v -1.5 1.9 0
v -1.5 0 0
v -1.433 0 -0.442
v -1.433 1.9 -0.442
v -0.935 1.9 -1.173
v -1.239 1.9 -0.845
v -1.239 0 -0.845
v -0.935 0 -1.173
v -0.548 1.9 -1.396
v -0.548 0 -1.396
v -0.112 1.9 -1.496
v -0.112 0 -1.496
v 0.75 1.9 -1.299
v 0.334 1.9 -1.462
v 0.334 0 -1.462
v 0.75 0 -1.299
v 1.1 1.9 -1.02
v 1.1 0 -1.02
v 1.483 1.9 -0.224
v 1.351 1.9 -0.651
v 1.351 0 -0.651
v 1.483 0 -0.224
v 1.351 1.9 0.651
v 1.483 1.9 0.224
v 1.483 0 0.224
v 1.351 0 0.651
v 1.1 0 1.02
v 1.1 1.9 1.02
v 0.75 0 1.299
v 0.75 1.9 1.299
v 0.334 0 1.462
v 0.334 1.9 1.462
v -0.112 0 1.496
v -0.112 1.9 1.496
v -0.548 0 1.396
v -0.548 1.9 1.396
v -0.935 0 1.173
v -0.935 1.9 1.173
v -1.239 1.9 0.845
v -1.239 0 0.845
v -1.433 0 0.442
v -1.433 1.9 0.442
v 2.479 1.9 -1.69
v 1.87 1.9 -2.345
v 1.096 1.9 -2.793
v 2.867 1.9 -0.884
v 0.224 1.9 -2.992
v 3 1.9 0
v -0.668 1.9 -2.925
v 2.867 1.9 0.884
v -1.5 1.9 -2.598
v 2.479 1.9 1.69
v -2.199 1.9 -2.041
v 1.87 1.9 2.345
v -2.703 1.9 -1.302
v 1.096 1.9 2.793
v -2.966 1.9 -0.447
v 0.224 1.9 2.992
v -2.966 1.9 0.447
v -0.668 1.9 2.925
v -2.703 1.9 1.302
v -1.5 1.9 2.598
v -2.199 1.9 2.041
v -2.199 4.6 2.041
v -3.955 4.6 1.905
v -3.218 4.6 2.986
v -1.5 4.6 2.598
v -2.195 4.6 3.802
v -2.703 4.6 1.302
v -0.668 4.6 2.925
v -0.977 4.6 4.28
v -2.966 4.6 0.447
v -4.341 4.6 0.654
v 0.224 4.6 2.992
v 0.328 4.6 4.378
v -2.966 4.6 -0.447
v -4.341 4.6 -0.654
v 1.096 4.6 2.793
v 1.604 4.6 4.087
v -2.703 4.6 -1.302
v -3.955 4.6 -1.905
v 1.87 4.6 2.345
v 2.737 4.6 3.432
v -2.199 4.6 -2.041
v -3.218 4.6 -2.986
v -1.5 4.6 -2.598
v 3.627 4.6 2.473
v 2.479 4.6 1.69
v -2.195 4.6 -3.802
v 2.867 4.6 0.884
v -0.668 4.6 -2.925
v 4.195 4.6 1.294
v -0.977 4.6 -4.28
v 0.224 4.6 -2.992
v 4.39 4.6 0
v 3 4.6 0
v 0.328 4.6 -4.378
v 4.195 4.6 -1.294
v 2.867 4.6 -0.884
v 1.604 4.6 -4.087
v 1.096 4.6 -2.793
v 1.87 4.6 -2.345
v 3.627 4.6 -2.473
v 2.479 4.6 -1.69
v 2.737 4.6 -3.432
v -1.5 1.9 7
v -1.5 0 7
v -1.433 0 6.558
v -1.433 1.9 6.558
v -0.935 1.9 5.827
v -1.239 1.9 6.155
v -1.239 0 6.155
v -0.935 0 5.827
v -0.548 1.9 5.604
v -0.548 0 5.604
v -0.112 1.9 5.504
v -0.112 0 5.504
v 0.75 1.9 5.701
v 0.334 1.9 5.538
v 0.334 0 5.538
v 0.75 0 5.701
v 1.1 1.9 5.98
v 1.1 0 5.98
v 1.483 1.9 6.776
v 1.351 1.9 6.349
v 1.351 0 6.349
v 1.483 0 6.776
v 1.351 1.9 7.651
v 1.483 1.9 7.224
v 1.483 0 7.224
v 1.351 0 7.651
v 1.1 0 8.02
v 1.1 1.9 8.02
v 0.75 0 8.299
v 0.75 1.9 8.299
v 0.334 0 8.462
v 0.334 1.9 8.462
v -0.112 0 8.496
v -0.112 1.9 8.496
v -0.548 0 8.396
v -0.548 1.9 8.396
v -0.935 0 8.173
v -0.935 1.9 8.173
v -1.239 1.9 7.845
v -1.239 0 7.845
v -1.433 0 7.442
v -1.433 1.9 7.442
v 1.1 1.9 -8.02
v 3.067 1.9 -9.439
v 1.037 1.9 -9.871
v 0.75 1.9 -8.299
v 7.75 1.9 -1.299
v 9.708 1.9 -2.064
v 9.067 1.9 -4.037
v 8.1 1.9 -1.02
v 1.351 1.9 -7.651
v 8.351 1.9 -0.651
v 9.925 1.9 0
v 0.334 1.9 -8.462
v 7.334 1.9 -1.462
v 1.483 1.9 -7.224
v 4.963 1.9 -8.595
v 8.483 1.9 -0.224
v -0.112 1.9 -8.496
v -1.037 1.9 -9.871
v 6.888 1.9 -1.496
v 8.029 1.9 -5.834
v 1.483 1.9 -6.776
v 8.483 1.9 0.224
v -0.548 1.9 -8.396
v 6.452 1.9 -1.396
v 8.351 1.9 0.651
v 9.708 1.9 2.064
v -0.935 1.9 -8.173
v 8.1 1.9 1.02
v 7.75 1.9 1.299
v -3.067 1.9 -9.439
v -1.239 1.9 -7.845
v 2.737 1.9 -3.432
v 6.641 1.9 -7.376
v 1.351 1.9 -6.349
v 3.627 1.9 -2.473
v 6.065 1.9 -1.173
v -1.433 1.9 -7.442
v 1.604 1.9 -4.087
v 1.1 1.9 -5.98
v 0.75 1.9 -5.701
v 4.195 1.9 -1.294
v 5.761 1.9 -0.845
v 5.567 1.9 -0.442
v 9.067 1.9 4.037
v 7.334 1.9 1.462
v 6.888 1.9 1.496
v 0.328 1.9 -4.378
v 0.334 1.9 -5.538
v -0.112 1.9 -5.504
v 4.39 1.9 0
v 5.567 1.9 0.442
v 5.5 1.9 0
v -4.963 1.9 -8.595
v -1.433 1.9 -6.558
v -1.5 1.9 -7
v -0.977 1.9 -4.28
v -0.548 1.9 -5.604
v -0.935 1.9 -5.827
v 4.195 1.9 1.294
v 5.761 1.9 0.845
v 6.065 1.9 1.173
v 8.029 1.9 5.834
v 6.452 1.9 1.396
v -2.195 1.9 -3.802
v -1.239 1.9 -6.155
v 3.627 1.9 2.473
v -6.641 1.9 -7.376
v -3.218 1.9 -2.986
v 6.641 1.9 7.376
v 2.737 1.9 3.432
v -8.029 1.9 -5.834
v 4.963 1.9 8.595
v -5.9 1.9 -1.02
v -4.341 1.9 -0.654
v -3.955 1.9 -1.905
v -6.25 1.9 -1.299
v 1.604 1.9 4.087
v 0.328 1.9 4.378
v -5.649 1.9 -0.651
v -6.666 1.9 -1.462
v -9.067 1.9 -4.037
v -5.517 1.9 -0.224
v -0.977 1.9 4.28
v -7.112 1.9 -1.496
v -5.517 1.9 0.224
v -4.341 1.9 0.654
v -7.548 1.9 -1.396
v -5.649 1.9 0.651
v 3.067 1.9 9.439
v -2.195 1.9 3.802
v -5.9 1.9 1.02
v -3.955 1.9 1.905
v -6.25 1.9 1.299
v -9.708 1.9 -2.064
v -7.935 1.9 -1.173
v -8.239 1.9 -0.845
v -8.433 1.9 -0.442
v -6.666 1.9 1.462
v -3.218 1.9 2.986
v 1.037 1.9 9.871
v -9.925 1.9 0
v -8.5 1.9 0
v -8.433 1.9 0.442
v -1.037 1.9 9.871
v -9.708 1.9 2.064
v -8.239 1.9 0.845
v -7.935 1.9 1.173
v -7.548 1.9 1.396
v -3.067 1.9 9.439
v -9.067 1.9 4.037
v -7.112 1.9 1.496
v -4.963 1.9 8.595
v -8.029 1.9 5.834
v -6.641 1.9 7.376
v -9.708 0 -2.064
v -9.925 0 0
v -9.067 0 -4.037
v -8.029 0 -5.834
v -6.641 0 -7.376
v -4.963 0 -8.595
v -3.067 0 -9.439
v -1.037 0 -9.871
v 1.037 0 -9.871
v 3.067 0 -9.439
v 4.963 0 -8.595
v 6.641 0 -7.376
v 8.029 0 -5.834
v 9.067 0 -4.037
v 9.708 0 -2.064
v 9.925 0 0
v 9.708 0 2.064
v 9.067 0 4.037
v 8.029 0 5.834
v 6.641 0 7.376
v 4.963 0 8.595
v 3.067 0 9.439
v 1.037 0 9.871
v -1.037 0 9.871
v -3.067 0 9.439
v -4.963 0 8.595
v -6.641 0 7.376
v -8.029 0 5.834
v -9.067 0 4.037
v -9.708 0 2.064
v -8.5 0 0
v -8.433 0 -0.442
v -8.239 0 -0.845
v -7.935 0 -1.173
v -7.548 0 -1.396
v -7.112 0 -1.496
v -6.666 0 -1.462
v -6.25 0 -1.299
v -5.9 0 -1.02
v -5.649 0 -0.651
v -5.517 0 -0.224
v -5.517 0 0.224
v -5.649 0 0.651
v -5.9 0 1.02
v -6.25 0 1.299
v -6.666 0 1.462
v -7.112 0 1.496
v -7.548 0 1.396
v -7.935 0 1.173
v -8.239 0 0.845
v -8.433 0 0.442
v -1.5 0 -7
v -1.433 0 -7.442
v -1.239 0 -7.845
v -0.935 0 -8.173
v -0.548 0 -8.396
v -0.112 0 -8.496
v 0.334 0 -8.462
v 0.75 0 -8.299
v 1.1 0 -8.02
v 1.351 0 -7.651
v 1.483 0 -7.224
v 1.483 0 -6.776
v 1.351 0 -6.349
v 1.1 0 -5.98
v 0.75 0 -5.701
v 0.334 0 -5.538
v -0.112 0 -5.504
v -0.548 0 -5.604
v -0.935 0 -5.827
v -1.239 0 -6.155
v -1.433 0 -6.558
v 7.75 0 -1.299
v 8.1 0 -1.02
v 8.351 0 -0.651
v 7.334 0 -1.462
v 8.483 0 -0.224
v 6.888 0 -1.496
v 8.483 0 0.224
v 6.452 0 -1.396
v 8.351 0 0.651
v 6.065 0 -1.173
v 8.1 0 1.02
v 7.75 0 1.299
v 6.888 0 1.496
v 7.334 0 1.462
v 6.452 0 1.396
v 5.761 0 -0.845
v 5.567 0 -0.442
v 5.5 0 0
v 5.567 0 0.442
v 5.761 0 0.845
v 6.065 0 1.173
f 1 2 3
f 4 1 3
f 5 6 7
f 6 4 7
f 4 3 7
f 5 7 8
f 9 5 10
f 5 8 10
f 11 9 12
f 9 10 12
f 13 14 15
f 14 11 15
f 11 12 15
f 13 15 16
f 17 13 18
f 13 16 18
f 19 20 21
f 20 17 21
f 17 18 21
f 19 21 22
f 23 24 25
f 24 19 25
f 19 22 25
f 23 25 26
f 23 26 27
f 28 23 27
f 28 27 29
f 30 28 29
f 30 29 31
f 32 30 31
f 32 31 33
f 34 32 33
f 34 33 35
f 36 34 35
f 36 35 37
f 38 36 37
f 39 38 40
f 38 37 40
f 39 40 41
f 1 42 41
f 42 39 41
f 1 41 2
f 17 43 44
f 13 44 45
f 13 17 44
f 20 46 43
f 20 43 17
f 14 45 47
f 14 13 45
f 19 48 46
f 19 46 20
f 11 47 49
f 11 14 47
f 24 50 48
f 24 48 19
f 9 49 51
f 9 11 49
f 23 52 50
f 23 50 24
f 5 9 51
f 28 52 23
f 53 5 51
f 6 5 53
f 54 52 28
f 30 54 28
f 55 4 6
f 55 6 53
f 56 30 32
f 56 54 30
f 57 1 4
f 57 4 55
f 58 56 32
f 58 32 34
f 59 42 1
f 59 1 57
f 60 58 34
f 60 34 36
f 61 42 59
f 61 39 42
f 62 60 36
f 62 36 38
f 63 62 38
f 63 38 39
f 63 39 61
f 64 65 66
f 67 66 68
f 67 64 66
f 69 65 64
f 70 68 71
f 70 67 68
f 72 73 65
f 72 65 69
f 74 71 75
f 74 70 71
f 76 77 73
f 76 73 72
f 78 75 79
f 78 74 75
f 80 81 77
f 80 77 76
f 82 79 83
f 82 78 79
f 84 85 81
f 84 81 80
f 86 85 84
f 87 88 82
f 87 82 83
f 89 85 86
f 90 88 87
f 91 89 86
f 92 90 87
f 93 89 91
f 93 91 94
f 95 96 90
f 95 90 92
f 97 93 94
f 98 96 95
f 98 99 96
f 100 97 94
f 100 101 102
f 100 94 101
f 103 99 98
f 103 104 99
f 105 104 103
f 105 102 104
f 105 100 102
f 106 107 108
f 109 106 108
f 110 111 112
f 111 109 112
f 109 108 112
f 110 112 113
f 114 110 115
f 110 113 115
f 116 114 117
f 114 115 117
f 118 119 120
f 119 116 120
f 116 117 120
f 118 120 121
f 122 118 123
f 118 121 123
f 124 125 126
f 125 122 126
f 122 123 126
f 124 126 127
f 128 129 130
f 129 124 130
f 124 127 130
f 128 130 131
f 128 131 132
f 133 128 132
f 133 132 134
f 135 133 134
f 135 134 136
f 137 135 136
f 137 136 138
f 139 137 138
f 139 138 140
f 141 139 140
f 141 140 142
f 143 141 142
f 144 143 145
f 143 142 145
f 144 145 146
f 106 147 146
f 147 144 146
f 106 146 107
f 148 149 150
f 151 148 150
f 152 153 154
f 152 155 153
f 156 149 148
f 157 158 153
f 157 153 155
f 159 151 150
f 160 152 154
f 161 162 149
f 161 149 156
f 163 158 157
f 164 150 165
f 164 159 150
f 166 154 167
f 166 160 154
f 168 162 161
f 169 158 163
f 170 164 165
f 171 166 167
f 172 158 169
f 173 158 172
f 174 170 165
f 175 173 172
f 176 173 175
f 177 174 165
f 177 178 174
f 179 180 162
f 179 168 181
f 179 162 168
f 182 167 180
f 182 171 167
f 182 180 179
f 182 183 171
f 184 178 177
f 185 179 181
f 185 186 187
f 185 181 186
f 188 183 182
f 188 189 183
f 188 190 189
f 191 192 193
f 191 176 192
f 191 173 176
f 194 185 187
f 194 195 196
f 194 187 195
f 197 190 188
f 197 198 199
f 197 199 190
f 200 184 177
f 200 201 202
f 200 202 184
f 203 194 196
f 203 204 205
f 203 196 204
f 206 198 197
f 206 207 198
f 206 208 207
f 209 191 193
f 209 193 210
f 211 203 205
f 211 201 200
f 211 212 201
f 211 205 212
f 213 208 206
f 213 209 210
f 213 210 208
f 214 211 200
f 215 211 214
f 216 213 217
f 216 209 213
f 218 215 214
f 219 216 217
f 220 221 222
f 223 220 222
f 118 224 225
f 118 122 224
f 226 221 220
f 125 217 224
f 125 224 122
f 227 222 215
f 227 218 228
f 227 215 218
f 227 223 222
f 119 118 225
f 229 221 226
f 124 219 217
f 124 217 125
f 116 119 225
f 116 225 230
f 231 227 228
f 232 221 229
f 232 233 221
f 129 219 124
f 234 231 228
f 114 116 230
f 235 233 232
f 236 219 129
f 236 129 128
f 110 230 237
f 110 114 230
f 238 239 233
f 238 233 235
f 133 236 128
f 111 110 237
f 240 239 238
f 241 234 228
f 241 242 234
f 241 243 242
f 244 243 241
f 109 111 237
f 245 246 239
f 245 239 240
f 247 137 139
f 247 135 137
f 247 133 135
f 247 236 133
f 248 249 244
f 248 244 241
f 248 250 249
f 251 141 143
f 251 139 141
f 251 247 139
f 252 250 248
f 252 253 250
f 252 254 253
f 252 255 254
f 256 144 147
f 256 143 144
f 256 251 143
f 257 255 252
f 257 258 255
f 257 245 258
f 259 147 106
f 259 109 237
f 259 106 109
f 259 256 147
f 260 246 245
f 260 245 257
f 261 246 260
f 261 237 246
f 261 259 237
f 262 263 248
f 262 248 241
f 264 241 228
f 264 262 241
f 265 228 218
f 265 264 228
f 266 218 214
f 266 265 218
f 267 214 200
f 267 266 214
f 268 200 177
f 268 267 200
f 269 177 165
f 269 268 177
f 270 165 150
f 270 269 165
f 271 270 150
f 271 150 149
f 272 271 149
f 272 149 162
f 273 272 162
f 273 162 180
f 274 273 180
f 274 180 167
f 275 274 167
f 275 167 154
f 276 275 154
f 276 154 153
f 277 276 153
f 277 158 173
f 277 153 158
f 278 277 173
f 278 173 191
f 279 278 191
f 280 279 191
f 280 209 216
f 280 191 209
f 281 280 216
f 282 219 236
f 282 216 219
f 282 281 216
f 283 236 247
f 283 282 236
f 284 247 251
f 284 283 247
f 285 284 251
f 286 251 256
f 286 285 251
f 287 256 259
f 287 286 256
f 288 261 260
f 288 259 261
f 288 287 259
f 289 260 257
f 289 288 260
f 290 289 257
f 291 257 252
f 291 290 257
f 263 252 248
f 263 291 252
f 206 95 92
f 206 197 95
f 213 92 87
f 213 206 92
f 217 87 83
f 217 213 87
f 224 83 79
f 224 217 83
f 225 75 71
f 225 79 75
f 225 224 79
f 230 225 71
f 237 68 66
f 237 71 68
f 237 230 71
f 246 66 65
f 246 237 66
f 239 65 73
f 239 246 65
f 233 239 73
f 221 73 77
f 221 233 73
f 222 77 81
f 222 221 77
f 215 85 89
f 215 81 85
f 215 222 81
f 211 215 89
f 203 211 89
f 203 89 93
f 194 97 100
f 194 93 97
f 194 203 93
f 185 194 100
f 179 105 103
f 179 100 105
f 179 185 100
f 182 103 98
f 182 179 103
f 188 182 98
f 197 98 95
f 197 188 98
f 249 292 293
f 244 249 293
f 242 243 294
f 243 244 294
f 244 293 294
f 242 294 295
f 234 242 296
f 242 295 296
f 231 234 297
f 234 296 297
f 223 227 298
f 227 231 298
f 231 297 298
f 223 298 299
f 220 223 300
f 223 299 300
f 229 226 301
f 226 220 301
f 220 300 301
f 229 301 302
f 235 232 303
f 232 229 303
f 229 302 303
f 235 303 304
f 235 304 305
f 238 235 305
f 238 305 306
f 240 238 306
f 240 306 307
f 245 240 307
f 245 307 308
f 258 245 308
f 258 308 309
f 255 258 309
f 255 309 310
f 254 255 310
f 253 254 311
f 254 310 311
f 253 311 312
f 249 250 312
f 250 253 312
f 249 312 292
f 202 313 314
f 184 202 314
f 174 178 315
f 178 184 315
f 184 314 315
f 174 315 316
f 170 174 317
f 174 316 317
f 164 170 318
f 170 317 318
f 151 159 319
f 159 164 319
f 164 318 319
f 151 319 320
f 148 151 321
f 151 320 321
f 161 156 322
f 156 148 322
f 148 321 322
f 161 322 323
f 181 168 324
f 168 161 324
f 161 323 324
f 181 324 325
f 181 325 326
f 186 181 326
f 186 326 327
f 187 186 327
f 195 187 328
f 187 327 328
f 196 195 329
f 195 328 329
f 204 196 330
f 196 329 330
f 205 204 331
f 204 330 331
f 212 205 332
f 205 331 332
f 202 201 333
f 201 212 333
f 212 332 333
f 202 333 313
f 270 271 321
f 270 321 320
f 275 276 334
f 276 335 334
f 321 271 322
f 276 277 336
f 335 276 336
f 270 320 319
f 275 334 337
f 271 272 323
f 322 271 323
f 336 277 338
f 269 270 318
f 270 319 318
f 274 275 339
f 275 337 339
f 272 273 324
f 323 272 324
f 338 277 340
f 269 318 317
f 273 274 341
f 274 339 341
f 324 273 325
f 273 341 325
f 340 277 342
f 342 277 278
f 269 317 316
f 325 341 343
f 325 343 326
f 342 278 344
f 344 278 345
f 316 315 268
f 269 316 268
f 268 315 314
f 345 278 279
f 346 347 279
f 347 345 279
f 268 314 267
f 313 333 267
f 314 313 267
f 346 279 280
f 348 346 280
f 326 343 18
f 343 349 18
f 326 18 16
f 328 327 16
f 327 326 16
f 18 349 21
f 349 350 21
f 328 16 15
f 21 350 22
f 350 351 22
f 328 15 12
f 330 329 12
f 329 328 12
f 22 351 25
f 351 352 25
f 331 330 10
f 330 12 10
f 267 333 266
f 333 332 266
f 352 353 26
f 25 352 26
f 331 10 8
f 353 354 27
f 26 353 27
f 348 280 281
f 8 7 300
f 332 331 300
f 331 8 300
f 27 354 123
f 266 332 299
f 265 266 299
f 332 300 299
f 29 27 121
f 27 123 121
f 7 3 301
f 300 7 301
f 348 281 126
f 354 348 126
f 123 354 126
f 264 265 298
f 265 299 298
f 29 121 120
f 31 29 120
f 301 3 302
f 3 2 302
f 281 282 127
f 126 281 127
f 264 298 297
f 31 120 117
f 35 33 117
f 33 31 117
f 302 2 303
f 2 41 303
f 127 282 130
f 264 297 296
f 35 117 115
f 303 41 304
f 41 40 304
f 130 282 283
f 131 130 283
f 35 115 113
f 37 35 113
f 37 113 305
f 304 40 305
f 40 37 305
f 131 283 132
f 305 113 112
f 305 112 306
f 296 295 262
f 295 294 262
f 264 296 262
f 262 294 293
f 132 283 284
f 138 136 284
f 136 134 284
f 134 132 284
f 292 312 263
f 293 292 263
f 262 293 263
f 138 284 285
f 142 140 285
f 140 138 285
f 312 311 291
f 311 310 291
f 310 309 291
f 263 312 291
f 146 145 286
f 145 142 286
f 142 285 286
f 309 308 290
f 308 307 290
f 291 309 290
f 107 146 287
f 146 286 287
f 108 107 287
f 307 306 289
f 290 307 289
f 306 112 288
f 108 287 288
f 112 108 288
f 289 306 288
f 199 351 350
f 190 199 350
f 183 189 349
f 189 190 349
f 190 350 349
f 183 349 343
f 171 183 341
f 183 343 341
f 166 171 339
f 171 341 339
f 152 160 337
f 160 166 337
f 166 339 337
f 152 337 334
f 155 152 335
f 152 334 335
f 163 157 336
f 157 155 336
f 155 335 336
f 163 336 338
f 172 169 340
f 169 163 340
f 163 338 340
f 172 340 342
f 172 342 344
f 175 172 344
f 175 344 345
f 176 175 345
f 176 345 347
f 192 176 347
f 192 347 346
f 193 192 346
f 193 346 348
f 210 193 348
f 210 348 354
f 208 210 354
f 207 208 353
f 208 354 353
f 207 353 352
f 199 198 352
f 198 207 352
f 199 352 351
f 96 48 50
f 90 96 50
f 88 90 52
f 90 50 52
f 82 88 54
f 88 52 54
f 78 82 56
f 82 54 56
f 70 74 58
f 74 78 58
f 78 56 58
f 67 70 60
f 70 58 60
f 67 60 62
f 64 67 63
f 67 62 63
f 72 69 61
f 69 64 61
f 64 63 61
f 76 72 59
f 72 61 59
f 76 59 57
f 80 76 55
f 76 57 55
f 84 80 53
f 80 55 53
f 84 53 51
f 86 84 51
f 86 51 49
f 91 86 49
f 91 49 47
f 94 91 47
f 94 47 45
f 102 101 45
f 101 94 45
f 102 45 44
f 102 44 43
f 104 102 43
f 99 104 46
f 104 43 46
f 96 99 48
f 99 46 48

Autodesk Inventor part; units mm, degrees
ref_plane "YZ Plane" through (0, 0, 0) normal (1, 0, 0) x (0, 1, 0)
ref_plane "XZ Plane" through (0, 0, 0) normal (0, 1, 0) x (-1, 0, 0)
ref_plane "XY Plane" through (0, 0, 0) normal (0, 0, 1) x (1, 0, 0)
sketch "Sketch14" plane through (0, 0, 0) normal (0, 1, 0) x (-1, 0, 0)
  circle A0 centre (0, 0) radius 9.925
  circle A1 centre (0, 0) radius 7 construction
  circle A2 centre (7, 0) radius 1.5
  circle A3 centre (0, 7) radius 1.5
  circle A4 centre (-7, 0) radius 1.5
  circle A5 centre (0, -7) radius 1.5
  circle A6 centre (0, 0) radius 1.5
  dimension "d70" = 14
  dimension "d63" = 19.85
  dimension "d64" = 3
  dimension "d67" = 360
  dimension "d71" = 3
extrude "Extrusion11" add sketch "Sketch14" along normal blind 1.9
sketch "Sketch15" plane through (0, 1.9, 0) normal (0, 1, 0) x (1, 0, 0)
  circle A0 centre (0, 0) radius 1.5 projected
  circle A1 centre (0, 0) radius 4.39
  circle A2 centre (0, 0) radius 3
  dimension "d74" = 8.78
  dimension "d75" = 6
extrude "Extrusion12" add sketch "Sketch15" along normal blind 2.7 contours A1
properties part number "ServoDrive" material "Steel"
